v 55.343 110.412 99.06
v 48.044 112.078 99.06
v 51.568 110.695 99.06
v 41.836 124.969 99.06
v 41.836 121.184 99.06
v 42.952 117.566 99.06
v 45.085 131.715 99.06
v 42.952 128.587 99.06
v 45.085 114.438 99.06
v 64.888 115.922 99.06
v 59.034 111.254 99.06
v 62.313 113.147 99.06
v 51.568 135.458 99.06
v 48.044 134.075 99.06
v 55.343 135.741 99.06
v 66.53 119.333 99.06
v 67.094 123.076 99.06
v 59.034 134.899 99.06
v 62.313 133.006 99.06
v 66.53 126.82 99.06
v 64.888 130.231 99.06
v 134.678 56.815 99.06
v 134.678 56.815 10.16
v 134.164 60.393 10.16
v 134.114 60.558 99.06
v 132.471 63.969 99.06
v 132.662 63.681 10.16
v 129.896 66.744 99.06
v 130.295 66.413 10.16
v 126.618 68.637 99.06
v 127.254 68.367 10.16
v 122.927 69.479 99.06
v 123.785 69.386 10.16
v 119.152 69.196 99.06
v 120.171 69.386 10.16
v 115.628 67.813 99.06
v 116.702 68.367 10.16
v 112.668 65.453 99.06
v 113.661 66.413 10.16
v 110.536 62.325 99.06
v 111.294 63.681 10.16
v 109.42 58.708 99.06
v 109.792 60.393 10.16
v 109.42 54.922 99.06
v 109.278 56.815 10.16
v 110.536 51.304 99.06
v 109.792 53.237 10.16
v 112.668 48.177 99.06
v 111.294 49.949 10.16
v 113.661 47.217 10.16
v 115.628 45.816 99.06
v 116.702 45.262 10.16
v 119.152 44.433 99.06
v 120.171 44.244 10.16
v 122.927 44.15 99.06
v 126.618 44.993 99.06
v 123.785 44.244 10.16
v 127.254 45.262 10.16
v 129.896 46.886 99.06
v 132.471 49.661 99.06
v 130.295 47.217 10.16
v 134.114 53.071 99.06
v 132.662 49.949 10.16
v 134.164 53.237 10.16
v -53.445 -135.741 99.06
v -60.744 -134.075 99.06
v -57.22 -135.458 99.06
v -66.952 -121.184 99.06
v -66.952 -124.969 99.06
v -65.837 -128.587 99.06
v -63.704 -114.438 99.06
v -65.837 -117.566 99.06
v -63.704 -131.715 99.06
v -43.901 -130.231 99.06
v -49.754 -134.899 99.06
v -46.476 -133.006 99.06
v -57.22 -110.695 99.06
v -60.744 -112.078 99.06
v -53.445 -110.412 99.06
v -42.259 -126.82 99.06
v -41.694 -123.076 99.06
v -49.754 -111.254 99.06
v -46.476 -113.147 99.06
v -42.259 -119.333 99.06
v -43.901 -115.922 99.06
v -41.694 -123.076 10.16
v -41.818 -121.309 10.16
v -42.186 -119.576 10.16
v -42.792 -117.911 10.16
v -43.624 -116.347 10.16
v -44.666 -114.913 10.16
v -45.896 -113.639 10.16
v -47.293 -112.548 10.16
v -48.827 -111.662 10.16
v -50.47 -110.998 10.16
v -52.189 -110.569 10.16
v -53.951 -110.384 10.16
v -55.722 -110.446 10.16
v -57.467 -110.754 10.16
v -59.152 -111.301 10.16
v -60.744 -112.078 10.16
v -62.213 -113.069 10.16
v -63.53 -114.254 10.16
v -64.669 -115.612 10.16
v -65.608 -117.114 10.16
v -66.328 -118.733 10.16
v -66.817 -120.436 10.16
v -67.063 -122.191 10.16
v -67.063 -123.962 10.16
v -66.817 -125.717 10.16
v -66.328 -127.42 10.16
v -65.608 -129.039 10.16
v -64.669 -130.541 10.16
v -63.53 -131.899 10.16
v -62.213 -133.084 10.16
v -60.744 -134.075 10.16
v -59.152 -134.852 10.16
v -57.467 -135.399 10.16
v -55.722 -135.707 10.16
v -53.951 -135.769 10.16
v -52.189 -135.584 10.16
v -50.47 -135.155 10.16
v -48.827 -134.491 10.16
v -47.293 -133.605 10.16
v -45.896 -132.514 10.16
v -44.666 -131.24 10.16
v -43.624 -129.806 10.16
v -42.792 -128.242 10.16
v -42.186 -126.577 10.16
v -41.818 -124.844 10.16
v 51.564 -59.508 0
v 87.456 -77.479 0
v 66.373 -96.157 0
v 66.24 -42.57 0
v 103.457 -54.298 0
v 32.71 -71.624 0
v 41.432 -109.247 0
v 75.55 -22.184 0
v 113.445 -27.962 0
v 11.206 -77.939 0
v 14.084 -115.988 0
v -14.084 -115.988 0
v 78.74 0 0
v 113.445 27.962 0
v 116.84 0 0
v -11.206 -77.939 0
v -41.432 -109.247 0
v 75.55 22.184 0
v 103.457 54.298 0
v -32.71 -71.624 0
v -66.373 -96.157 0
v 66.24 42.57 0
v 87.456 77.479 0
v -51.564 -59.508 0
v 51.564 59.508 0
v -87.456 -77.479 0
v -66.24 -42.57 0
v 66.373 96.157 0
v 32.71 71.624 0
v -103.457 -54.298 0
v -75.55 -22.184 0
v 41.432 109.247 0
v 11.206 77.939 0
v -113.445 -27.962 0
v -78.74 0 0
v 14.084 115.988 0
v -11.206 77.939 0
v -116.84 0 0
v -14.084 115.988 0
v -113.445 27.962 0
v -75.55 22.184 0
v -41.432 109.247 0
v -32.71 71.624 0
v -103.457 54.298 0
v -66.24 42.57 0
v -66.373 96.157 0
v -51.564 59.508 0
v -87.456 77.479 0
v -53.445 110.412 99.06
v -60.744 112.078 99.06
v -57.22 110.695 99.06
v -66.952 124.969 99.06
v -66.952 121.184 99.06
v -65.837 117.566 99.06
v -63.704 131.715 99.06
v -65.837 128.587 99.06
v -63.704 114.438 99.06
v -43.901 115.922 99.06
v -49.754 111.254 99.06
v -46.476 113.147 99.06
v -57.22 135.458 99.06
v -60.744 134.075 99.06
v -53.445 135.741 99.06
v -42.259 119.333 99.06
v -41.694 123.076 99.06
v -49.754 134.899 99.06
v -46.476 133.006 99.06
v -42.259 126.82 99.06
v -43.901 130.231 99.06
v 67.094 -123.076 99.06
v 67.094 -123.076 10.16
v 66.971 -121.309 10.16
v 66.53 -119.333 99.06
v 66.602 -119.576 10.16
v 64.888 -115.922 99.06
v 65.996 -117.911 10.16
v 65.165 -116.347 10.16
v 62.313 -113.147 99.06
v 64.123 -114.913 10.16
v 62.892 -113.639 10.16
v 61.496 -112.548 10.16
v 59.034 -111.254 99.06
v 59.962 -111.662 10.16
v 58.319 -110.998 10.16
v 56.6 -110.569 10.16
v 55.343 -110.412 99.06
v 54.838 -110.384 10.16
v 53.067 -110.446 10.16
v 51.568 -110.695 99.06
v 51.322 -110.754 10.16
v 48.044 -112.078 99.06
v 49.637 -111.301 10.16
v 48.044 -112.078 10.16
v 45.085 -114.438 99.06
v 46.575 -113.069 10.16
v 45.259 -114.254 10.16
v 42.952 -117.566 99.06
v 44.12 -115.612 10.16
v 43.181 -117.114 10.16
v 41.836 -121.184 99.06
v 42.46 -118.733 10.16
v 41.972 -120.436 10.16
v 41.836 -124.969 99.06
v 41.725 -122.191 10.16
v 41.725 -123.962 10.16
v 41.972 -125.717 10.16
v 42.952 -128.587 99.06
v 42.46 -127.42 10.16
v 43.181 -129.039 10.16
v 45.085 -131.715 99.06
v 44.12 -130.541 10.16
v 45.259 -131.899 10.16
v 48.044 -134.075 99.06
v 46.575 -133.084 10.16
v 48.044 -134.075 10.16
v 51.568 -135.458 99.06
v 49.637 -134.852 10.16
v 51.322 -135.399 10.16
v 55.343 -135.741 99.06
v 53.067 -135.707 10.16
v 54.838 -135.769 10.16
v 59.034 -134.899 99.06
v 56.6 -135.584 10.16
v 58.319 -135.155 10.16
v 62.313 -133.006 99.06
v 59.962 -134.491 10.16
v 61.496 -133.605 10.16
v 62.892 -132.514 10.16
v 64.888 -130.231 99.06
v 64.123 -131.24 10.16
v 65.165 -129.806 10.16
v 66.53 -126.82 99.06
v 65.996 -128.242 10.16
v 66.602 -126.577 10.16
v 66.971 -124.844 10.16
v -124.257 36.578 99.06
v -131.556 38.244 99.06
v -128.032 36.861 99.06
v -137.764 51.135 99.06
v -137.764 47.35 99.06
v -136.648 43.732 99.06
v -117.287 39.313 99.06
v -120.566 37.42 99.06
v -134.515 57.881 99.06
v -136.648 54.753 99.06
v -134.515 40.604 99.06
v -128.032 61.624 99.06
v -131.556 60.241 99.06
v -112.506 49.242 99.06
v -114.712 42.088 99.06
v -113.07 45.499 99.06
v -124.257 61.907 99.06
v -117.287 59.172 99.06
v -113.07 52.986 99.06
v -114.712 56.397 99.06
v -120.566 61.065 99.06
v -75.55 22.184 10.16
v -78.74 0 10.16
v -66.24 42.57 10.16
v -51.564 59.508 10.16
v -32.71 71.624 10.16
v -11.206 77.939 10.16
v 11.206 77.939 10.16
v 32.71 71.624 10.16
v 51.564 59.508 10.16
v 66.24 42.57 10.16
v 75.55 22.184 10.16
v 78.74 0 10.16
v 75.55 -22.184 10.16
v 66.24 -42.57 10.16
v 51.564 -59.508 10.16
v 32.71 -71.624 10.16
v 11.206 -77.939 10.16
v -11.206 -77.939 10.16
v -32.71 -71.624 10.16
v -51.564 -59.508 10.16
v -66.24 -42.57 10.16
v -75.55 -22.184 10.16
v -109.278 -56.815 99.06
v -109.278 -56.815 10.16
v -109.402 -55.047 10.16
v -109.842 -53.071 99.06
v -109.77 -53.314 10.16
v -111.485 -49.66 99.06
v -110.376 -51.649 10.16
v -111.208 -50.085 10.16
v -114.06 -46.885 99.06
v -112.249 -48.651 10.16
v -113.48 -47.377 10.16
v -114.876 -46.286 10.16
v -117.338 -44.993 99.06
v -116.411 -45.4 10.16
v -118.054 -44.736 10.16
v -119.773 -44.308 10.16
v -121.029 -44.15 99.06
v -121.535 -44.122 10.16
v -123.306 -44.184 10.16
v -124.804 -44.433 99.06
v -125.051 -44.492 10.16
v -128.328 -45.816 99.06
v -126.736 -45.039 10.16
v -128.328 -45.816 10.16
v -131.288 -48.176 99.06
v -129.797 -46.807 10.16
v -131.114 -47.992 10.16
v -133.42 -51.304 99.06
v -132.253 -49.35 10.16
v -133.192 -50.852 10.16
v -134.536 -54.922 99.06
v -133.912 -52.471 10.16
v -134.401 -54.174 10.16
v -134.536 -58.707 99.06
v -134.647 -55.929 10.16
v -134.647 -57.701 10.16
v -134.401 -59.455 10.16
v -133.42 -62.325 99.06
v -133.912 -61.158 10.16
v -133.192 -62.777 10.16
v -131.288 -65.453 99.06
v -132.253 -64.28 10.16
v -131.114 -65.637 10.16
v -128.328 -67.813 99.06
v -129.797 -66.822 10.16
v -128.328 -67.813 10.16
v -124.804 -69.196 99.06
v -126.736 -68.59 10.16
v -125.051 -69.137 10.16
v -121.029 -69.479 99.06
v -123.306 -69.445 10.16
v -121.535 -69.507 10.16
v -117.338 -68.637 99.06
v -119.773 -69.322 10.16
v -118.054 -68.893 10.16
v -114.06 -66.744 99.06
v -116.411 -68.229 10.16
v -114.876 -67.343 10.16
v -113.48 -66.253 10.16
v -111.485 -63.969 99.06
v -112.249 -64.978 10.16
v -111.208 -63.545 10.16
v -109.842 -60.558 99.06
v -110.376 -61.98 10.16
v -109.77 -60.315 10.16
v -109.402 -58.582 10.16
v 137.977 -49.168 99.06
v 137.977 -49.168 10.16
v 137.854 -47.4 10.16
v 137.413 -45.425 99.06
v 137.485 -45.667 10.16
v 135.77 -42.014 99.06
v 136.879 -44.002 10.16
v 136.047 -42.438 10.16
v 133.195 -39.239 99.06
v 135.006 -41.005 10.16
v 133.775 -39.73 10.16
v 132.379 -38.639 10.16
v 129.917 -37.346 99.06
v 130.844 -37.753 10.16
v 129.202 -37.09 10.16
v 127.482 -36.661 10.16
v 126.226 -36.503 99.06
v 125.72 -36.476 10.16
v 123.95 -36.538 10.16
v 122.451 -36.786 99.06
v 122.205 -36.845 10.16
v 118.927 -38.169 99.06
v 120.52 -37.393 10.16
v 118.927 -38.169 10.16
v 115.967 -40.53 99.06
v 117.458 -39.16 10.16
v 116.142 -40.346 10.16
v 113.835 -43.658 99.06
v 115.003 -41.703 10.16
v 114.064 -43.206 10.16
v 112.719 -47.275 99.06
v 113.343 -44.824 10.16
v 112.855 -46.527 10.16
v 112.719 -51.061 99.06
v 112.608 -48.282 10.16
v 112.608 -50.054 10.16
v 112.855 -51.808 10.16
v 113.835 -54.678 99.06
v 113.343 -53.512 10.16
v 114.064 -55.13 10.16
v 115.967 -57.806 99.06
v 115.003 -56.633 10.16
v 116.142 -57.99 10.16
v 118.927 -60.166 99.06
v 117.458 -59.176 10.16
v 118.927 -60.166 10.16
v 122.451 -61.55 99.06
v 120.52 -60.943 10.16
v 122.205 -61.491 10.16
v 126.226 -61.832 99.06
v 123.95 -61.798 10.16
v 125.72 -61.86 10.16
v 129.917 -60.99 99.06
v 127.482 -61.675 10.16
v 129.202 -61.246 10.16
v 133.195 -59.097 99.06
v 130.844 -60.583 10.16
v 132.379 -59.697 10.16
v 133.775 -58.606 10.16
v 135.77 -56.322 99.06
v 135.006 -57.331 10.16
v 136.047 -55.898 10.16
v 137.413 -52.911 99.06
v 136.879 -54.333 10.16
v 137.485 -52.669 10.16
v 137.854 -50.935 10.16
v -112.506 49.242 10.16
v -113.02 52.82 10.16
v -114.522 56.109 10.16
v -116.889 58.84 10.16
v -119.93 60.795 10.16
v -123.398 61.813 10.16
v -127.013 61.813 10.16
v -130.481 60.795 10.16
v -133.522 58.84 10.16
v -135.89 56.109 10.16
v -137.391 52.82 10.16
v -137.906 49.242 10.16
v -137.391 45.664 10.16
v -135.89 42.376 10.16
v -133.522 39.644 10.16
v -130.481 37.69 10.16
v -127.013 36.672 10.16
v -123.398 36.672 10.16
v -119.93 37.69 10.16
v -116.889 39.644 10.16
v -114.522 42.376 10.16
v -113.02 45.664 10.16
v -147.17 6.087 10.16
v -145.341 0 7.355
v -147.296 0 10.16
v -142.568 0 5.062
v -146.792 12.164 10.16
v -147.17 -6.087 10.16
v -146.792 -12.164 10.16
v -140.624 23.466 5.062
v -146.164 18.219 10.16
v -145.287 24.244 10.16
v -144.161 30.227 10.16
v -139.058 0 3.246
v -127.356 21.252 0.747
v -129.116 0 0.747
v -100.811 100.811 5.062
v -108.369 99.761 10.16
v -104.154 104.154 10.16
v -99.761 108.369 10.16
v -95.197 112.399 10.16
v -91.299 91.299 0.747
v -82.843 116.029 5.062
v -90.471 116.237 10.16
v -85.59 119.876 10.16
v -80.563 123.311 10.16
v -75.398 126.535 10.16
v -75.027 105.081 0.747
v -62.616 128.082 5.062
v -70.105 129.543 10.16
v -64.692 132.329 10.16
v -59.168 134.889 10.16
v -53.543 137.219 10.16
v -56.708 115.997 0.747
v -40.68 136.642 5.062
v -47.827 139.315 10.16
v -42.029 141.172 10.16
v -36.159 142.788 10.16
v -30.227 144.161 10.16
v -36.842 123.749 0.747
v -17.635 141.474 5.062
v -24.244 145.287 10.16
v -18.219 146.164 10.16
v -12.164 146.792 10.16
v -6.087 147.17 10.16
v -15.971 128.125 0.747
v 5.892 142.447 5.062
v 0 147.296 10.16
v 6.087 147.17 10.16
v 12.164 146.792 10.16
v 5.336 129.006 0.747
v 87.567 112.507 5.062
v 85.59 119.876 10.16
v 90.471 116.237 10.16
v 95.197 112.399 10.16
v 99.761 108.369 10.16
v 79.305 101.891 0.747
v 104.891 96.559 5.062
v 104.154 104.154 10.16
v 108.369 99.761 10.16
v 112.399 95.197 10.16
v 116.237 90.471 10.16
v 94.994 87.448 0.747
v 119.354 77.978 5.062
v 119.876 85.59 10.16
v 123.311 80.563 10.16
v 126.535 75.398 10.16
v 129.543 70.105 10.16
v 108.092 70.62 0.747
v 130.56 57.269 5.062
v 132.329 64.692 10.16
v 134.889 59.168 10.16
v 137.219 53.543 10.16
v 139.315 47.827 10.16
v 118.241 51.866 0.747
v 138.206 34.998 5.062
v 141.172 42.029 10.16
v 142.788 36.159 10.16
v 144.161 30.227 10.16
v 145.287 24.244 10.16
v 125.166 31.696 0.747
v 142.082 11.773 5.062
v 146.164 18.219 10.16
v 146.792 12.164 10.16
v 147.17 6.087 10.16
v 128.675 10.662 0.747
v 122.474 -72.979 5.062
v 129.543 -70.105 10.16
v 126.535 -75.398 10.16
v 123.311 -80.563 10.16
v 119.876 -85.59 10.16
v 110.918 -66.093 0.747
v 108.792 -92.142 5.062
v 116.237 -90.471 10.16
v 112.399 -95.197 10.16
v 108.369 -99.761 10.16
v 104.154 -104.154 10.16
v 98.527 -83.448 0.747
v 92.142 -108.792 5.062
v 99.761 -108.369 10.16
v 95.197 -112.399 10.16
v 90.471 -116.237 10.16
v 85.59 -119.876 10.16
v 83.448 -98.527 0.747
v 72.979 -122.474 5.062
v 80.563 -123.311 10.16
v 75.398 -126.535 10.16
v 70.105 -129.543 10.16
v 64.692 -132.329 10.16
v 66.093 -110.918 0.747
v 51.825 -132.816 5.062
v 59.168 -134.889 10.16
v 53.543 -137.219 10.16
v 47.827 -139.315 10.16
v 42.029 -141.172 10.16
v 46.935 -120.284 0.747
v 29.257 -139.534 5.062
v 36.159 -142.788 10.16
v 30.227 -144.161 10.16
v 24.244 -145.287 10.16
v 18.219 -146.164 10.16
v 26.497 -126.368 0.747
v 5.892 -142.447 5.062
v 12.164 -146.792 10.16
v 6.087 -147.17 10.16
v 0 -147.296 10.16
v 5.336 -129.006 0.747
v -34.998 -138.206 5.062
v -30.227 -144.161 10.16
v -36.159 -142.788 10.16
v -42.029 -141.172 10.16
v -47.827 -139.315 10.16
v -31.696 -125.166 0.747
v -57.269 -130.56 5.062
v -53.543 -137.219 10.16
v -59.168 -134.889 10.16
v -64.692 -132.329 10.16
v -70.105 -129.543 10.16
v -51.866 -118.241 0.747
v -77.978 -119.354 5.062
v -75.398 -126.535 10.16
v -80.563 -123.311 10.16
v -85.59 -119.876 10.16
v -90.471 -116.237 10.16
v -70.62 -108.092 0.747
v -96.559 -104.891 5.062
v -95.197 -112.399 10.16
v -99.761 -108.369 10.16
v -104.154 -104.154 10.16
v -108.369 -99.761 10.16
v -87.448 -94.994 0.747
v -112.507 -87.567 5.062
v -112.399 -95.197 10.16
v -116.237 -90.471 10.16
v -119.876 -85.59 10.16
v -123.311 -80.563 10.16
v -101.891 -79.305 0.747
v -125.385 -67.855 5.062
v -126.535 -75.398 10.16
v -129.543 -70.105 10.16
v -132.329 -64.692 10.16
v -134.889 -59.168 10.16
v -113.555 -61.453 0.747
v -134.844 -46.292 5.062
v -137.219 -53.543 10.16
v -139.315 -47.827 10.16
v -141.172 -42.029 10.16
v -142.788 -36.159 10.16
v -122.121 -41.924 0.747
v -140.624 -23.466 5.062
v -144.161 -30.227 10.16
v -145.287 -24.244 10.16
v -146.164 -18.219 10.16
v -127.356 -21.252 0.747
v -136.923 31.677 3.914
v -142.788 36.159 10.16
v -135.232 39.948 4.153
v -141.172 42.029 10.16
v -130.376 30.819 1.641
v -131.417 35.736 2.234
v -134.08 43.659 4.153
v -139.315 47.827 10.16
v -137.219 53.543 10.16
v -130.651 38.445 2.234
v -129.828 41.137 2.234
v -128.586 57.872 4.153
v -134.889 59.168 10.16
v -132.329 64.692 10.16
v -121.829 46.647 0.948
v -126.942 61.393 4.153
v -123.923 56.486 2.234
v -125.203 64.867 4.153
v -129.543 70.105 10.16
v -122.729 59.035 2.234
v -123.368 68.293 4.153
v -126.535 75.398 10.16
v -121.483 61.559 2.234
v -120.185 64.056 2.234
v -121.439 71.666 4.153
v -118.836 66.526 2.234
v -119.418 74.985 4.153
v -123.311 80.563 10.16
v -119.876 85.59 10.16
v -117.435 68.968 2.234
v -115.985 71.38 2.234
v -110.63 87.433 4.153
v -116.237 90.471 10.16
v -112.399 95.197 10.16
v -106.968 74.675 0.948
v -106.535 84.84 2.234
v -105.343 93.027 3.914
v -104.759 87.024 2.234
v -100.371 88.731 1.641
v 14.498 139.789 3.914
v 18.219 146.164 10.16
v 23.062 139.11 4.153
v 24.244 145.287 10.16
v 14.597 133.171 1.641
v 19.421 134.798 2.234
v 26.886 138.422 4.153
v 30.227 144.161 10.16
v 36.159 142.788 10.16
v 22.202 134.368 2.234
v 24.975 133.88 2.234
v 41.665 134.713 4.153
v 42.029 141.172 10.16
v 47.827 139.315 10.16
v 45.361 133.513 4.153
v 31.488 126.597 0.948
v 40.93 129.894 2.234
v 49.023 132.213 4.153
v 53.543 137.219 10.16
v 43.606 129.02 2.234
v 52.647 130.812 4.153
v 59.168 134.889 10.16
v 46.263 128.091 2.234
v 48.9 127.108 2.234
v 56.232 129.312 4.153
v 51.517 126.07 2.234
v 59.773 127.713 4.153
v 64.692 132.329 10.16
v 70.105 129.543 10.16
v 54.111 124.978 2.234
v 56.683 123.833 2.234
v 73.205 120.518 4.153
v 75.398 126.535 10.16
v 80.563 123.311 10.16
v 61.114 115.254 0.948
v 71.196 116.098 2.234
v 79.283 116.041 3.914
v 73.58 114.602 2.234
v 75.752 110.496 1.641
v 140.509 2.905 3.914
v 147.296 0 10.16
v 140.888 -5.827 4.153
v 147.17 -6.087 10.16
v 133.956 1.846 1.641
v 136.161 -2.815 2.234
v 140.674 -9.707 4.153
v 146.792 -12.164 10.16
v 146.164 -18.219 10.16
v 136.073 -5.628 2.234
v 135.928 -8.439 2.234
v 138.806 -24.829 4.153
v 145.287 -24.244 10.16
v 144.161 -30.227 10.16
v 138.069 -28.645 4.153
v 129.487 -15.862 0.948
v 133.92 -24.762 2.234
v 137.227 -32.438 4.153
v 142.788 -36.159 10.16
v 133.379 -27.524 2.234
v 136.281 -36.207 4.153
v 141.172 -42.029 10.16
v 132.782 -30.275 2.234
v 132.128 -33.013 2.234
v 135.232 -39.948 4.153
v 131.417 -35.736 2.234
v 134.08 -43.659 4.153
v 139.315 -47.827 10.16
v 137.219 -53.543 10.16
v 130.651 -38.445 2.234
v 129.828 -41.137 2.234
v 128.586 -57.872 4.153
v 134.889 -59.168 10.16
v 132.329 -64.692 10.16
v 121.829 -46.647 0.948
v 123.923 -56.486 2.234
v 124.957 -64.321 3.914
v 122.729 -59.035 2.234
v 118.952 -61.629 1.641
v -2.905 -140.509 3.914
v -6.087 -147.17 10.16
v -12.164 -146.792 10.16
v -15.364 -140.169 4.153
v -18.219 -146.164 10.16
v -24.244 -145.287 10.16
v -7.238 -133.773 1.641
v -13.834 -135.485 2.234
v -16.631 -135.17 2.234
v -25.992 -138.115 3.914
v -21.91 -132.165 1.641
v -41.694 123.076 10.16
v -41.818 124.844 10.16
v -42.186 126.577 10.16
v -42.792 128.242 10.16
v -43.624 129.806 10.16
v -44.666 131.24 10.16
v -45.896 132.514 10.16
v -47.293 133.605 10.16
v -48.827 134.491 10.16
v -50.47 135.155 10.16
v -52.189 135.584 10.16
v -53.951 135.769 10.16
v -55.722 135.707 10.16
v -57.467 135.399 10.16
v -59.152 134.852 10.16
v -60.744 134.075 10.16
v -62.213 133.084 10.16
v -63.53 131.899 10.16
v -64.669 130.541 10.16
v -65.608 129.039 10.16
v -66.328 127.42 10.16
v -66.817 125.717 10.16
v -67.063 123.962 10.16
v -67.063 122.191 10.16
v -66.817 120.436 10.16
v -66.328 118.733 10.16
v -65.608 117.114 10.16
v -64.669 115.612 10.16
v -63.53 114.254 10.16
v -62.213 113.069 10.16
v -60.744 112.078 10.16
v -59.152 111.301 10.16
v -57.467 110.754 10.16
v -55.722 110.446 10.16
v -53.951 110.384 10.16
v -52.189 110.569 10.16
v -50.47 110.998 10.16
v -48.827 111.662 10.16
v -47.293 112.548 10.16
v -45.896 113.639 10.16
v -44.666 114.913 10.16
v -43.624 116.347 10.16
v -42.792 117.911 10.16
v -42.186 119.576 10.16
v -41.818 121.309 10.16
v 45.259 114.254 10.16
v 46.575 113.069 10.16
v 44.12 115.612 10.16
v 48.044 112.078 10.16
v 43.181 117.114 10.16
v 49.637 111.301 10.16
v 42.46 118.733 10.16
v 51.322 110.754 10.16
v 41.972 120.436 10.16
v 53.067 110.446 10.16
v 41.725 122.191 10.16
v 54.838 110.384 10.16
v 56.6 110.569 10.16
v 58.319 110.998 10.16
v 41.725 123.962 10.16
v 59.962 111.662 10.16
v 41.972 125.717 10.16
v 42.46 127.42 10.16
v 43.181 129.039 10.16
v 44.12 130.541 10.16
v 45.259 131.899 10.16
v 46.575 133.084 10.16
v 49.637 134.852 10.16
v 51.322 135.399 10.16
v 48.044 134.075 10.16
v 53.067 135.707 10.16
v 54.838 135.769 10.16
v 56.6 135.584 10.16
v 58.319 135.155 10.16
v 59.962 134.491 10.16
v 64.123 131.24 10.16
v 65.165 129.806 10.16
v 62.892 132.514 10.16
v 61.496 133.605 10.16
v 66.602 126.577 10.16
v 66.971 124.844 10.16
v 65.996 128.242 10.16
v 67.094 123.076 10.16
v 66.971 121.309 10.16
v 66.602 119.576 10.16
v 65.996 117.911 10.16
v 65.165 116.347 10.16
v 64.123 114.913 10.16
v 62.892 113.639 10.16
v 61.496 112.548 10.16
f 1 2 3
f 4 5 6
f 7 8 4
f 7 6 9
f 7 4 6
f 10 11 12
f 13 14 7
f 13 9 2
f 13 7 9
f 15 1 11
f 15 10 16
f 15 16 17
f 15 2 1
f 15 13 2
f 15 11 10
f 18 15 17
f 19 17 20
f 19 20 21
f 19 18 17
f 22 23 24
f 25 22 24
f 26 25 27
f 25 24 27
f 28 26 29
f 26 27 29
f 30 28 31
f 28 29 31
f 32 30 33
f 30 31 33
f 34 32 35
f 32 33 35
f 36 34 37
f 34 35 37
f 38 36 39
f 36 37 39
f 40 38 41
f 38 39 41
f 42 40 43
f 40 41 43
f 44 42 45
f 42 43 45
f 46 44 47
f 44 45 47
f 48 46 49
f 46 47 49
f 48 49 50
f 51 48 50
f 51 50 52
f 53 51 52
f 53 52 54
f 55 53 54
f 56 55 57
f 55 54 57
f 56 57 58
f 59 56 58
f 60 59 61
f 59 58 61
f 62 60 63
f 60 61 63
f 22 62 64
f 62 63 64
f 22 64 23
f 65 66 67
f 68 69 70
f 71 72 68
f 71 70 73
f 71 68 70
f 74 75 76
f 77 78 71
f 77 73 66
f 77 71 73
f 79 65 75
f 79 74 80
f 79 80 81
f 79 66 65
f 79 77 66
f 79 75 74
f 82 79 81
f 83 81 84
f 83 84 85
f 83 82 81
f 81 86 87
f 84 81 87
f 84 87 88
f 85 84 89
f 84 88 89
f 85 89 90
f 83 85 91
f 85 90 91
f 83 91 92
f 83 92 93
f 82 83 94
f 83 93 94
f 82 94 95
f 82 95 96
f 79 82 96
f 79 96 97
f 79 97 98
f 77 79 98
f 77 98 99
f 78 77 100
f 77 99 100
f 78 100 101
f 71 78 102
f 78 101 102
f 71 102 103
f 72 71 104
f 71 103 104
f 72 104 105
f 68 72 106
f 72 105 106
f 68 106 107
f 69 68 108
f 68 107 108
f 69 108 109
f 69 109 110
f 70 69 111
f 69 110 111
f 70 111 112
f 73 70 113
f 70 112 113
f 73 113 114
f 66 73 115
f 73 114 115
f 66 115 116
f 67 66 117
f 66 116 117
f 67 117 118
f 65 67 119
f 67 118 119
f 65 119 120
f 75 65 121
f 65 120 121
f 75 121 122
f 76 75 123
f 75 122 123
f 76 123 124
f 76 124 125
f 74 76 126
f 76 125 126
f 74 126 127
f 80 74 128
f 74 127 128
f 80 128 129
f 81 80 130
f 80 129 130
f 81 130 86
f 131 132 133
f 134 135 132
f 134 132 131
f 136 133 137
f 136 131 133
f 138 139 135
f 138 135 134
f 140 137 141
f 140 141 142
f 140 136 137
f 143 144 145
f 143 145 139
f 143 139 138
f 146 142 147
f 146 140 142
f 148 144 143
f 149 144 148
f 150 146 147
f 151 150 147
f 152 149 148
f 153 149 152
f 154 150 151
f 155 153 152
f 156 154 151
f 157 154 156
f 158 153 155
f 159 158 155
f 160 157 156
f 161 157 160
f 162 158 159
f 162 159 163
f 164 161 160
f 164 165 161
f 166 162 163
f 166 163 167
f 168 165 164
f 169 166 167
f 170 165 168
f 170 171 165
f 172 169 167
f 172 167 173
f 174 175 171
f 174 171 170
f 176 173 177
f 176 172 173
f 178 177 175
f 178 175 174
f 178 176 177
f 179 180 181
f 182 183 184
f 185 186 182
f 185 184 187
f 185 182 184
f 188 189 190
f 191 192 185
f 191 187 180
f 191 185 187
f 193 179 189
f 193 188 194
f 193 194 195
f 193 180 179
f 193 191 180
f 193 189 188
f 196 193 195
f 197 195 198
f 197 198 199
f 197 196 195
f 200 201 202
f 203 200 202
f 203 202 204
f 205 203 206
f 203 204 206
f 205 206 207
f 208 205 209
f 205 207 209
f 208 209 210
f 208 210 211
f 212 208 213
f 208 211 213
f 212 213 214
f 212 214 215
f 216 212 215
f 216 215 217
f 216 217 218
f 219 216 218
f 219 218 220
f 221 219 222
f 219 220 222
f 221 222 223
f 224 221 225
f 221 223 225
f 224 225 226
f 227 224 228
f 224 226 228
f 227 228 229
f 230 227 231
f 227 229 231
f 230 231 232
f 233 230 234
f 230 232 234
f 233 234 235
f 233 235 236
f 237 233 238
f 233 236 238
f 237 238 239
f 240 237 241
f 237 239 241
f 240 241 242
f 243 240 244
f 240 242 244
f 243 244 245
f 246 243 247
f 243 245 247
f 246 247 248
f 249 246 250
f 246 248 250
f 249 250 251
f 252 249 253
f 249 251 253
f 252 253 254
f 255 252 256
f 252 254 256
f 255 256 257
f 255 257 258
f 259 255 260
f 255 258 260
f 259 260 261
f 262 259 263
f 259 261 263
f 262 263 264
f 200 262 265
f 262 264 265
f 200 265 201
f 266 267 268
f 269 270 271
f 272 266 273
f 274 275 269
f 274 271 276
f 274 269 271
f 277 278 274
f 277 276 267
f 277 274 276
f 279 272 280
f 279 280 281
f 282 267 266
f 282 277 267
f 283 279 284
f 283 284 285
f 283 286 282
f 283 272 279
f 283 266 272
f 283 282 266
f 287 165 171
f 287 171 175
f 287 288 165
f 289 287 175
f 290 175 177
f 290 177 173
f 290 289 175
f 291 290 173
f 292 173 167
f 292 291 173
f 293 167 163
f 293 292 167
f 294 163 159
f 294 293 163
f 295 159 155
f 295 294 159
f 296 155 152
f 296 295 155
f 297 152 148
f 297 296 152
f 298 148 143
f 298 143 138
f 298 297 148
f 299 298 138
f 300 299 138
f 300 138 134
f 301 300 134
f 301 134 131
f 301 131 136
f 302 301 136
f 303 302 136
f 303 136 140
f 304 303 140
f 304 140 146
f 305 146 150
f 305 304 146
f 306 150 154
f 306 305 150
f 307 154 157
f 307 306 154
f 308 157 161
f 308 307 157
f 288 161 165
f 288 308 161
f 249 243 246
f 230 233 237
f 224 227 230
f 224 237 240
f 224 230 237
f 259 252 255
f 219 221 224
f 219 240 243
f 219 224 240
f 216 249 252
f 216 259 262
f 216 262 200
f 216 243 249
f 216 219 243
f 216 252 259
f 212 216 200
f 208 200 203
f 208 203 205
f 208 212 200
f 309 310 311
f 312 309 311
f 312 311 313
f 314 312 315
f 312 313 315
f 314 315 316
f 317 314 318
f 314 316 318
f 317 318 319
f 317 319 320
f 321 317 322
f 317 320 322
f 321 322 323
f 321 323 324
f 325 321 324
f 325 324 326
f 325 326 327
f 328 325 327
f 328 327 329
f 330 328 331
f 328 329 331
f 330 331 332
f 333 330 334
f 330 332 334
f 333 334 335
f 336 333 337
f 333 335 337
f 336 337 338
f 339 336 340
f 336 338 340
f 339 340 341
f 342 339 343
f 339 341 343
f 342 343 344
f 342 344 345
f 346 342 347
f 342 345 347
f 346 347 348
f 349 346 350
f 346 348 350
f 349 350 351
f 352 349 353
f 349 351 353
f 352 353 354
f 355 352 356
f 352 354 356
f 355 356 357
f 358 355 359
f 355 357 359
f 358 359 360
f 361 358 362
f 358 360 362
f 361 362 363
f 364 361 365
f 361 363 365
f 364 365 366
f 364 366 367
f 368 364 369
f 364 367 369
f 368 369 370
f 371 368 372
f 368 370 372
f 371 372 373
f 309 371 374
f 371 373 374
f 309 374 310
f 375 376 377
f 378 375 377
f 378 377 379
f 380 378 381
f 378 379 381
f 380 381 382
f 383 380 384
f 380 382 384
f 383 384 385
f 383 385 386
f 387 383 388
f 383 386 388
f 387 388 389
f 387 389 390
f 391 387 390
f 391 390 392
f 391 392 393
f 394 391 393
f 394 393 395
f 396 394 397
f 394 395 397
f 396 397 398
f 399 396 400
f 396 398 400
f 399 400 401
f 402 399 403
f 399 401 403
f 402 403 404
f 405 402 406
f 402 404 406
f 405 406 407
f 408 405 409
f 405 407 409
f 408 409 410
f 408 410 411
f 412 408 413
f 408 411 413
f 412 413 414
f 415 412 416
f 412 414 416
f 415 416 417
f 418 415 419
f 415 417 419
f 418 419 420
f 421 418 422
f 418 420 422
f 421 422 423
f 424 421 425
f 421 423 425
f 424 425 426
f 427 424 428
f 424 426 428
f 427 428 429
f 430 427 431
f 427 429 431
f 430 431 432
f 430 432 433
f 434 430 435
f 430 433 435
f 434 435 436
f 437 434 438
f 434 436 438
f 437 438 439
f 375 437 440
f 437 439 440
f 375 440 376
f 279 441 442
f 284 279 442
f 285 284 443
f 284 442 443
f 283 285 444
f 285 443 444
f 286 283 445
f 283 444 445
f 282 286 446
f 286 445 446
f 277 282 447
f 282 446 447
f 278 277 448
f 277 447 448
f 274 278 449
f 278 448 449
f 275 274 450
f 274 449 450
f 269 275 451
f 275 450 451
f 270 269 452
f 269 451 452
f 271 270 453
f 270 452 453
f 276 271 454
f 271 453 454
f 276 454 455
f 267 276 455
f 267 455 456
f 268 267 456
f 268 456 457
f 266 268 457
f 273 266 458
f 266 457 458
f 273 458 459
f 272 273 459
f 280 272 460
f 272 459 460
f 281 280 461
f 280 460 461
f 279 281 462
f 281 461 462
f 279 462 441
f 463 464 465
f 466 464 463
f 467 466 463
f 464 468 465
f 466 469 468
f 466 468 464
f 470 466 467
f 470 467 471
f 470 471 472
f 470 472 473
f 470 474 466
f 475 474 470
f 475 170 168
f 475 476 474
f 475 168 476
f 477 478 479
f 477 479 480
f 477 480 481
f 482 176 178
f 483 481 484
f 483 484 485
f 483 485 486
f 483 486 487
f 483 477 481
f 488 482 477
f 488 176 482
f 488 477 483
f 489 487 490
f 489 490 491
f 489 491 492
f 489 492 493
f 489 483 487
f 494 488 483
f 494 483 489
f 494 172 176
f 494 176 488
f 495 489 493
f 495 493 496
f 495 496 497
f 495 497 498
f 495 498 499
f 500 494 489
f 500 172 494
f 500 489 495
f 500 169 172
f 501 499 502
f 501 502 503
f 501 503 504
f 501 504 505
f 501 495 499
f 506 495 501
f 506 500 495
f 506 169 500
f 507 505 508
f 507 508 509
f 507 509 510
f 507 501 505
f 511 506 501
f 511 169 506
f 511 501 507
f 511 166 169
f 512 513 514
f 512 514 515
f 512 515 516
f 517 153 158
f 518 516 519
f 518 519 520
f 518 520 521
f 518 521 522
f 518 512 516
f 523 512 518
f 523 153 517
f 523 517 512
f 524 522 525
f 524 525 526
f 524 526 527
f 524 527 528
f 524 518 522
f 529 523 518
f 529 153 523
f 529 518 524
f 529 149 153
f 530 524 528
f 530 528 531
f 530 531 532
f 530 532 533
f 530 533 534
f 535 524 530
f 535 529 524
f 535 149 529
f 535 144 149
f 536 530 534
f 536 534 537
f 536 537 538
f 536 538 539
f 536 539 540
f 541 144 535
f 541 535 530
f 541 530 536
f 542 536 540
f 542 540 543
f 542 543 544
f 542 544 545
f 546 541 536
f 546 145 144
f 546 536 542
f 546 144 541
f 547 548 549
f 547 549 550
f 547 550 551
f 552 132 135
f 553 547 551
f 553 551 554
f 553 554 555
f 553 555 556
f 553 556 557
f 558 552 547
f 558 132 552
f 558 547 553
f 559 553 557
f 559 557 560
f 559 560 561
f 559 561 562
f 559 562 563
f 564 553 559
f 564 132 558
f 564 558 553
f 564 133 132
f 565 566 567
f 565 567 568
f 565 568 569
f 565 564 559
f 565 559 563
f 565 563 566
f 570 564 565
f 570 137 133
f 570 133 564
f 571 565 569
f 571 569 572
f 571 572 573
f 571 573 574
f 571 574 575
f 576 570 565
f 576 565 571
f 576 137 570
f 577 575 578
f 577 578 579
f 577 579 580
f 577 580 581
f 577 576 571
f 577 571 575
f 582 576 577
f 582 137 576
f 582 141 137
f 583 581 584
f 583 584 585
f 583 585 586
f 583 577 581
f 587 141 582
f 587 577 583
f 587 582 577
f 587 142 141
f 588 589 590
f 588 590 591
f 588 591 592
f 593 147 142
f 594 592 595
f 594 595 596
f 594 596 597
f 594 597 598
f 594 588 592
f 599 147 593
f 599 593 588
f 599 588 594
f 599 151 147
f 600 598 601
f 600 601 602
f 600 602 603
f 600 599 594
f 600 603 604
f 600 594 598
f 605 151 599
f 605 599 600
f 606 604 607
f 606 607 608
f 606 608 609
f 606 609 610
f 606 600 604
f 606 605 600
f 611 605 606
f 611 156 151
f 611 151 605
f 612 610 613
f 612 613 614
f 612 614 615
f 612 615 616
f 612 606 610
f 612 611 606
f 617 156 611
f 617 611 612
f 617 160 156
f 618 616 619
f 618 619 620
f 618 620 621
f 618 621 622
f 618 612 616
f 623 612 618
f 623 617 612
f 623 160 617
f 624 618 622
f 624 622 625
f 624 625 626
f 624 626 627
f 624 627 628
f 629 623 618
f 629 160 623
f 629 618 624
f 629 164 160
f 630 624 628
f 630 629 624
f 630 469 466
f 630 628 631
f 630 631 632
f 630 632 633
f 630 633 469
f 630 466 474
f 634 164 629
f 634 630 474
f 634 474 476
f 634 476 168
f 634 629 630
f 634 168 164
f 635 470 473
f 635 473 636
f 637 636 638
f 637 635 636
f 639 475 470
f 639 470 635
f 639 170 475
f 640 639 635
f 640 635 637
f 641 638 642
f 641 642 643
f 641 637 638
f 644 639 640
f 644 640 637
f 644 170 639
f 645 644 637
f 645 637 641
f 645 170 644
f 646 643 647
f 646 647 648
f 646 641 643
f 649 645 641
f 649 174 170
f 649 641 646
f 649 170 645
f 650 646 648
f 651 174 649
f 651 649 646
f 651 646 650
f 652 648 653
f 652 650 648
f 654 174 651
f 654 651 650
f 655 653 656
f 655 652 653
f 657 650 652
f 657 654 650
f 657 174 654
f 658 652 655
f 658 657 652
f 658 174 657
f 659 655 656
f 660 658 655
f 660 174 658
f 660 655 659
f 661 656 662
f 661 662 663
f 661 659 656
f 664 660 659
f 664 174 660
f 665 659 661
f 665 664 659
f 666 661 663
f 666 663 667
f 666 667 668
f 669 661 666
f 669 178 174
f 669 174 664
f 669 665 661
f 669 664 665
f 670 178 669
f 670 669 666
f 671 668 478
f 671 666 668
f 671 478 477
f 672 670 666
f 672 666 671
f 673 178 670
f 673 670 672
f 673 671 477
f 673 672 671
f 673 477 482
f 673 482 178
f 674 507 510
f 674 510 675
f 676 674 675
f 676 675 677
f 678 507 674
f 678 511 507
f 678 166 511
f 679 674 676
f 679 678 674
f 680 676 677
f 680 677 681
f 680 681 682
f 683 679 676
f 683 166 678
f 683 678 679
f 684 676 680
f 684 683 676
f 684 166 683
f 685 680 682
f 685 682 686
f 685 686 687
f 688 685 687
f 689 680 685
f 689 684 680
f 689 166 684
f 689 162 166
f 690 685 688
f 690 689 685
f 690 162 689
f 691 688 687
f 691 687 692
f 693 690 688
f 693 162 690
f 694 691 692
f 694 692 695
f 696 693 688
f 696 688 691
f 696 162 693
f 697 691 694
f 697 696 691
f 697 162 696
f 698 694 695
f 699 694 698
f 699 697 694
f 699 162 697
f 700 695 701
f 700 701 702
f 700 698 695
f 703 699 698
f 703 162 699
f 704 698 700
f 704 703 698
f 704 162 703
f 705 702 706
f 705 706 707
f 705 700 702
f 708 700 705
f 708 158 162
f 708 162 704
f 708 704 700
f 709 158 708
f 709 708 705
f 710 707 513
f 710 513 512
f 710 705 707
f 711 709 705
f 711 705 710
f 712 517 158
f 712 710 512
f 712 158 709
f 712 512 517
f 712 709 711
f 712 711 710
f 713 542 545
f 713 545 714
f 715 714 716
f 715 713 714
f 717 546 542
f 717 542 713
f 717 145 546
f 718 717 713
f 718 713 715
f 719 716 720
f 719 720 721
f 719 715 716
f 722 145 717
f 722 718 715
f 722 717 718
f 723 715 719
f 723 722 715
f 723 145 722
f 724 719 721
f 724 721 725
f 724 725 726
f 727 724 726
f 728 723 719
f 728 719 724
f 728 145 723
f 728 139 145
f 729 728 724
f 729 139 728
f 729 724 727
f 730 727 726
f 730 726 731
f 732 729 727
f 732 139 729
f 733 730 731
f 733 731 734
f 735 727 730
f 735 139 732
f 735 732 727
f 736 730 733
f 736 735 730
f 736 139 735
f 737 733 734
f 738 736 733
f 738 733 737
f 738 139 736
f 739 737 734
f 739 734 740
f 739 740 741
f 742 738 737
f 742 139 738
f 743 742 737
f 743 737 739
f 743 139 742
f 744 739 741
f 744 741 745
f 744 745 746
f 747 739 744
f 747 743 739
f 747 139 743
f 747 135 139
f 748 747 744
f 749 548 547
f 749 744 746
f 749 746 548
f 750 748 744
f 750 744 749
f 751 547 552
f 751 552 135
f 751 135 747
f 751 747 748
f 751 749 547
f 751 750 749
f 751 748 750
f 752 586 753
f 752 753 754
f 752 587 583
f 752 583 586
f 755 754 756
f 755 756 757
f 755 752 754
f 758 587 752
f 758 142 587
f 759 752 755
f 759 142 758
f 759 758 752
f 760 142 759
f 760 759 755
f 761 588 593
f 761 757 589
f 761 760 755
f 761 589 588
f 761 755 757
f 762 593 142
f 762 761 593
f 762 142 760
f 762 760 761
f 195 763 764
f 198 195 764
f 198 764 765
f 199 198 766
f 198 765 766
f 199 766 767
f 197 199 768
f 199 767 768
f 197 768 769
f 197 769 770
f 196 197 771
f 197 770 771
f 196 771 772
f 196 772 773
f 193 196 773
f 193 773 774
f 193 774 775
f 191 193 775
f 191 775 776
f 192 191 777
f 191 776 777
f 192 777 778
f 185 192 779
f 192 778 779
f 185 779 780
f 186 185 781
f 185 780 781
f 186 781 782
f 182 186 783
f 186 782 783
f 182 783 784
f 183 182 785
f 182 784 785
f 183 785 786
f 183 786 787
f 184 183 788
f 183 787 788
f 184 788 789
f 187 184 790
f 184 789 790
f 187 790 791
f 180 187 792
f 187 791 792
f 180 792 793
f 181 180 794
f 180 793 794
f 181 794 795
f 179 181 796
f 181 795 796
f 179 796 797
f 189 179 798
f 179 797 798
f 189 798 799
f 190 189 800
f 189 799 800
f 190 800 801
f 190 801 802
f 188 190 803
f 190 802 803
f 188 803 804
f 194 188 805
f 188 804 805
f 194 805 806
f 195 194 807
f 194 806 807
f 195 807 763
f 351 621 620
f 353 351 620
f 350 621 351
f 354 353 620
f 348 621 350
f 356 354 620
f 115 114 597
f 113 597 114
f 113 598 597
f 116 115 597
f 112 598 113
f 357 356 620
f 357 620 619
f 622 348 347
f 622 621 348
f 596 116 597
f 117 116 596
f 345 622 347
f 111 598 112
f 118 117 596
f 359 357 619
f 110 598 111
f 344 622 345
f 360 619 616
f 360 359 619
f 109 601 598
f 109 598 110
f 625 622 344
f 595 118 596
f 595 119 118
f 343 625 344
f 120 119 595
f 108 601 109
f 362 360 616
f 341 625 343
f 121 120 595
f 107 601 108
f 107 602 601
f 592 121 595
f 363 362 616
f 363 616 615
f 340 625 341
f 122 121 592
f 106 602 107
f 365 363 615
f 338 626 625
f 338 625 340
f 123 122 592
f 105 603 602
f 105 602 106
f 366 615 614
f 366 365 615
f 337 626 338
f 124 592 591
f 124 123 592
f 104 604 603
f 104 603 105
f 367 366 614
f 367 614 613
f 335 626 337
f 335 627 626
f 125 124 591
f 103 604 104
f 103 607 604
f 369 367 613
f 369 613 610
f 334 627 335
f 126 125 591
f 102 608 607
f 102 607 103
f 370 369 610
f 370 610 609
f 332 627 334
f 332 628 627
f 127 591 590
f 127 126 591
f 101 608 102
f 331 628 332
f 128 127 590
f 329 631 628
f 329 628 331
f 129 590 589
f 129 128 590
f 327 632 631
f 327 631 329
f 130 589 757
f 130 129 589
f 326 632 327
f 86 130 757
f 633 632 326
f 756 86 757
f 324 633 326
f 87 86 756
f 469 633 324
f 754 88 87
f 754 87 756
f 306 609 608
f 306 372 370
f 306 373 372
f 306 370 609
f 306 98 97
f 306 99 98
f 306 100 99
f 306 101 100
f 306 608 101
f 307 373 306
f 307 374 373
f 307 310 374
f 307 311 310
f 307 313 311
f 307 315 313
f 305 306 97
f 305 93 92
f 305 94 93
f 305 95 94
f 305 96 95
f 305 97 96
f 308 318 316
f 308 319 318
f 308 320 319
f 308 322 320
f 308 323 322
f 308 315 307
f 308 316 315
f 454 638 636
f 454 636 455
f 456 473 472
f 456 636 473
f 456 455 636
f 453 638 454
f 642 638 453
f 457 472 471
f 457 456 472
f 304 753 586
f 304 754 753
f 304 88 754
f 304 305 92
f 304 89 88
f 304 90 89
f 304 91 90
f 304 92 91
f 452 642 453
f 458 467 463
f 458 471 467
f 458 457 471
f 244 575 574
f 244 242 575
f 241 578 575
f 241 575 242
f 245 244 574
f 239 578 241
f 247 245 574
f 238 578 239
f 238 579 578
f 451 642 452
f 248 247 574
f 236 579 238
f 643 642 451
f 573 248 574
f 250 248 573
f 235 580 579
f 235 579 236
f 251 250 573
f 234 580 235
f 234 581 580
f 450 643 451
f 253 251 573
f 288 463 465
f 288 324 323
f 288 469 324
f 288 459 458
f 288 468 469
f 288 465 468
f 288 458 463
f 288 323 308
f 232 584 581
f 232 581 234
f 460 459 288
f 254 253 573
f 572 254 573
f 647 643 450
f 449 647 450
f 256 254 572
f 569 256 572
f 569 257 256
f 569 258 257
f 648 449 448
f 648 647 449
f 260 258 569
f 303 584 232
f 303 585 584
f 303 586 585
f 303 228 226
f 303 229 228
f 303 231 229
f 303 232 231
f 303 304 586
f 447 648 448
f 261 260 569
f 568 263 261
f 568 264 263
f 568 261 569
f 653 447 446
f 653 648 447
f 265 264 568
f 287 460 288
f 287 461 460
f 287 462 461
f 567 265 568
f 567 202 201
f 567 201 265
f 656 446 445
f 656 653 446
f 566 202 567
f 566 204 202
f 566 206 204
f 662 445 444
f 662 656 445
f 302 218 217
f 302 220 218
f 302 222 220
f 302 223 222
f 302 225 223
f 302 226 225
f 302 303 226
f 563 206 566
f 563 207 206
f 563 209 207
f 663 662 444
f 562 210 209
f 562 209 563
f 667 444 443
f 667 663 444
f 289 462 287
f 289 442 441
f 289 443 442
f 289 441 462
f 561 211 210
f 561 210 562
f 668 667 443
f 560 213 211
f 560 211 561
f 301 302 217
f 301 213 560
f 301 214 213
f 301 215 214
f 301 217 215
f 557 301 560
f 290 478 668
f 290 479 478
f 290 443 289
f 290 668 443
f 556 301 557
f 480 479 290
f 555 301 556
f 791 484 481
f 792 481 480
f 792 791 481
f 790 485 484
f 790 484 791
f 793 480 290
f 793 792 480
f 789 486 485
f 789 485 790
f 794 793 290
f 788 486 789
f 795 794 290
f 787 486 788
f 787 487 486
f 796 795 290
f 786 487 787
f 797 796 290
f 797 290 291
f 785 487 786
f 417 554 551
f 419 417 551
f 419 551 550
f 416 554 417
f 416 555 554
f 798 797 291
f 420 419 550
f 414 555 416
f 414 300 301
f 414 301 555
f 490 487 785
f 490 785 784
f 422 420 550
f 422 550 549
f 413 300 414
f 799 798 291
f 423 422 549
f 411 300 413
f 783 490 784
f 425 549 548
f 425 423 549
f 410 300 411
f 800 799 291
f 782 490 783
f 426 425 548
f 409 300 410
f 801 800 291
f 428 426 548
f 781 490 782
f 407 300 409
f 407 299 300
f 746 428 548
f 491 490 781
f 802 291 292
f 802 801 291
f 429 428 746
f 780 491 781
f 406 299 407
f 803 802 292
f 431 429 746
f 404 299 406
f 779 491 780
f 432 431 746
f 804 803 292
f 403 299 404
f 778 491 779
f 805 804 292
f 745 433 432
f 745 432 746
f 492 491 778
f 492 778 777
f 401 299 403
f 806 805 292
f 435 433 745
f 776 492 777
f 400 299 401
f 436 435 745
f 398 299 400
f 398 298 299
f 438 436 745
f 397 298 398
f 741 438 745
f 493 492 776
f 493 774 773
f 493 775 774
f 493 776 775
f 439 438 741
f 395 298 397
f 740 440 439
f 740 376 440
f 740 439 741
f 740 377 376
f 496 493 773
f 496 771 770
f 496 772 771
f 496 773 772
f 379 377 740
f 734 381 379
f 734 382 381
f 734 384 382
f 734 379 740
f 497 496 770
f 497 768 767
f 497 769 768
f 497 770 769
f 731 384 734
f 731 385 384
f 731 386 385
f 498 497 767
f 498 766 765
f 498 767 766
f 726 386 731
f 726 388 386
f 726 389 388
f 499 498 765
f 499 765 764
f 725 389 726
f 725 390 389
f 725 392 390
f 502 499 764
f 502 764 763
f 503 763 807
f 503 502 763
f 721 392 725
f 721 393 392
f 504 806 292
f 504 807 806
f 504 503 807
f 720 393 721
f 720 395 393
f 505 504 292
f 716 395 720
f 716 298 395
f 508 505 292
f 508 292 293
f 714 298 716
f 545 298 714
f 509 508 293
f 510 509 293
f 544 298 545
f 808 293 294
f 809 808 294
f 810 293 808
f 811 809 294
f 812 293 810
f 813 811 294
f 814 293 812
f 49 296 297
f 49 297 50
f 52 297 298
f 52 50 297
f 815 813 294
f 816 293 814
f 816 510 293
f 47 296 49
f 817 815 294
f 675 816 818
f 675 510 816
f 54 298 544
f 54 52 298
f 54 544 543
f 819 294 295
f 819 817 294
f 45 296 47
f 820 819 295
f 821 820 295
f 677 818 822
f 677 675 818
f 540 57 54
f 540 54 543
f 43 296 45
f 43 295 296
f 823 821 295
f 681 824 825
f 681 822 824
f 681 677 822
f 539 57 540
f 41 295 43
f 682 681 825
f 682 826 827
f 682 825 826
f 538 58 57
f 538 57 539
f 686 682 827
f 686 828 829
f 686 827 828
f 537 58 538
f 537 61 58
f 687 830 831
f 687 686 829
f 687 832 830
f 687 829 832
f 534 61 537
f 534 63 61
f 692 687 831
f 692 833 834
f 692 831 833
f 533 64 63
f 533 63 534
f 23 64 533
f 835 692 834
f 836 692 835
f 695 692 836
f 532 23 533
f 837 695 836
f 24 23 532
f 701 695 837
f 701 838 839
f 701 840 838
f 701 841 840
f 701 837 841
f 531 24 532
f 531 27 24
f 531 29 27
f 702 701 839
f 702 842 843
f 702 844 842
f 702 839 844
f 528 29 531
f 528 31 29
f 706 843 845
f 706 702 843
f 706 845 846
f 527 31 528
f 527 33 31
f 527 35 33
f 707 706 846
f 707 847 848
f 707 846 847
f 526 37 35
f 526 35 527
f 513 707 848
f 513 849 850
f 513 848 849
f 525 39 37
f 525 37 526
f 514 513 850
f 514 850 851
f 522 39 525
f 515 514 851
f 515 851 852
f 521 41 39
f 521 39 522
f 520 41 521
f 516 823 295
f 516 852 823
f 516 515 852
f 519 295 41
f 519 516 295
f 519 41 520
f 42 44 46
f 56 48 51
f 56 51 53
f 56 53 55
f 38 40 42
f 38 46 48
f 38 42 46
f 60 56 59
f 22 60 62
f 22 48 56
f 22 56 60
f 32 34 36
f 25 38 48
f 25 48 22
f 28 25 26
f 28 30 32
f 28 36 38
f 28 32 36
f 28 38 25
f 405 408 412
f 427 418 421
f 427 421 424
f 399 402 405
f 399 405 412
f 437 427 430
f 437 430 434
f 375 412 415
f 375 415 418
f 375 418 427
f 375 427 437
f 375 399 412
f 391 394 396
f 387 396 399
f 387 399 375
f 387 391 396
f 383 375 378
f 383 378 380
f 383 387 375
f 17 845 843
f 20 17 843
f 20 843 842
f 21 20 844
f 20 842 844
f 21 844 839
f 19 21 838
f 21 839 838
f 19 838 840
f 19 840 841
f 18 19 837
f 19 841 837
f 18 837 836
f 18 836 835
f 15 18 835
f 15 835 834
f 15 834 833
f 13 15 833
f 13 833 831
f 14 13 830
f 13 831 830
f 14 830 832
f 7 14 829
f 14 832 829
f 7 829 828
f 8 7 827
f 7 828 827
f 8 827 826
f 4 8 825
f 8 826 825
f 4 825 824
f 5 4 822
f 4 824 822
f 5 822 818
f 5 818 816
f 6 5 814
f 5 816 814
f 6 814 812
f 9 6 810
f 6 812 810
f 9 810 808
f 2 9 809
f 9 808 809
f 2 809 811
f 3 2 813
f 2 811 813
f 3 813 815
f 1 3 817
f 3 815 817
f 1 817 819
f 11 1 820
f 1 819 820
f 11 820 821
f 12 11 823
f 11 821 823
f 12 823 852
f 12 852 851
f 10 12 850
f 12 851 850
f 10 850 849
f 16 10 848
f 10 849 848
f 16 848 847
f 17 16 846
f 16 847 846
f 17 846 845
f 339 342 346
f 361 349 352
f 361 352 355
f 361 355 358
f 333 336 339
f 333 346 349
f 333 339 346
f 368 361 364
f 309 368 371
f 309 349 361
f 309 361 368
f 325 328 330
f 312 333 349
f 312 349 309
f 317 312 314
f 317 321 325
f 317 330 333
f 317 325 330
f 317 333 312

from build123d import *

# Parameters (mm, degrees)
F0_W     = 38.1
F0_H     = 10.16
F2_R     = 12.7
F3_DEPTH = 88.9
F4_DEPTH = 88.9


# Not quite as in the source:
# - a feature names something its author has since deleted; it is built from what else it names


with BuildPart() as f1:
    # F0 (on Front) → F1 (revolve)
    with BuildSketch(Plane.XZ):
        with BuildLine():
            add(Edge.make_bspline(
                [(-147.2955053902, 10.16), (-143.5447688246, 2.570837969), (-131.58254077, 0), (-116.84, 0)],
                knots=[0, 0, 0, 0, 32.1055043345, 32.1055043345, 32.1055043345, 32.1055043345], degree=3))
            Line((-116.84, 0), (-116.84, 10.16))
            Line((-116.84, 10.16), (-147.2955053902, 10.16))
        make_face()
        with Locations((-97.79, 5.08)):
            Rectangle(F0_W, F0_H)
    revolve(axis=Axis((0, 0, 13.0290351808), (0, 0, -1)))

    # F2 (on face) → F3 (join)
    with BuildSketch(Plane.XY.offset(10.16)):
        with Locations((-54.3942935765, 123.0764985085)):
            Circle(F2_R)
        with Locations((54.3942935765, 123.0764985085)):
            Circle(F2_R)
        with Locations((121.978003574, 56.8147908631)):
            Circle(F2_R)
        with Locations((125.2771361136, -49.1679397622)):
            Circle(F2_R)
        with Locations((54.3942935765, -123.0764985085)):
            Circle(F2_R)
        with Locations((-54.3942935765, -123.0764985085)):
            Circle(F2_R)
        with Locations((-121.9781520783, -56.8146452636)):
            Circle(F2_R)
    extrude(amount=F3_DEPTH)

    # F2 (on face) → F4 (join)
    with BuildSketch(Plane.XY.offset(10.16)):
        with Locations((-125.2057118813, 49.2424128206)):
            Circle(F2_R)
    extrude(amount=F4_DEPTH)


solid = f1.part
